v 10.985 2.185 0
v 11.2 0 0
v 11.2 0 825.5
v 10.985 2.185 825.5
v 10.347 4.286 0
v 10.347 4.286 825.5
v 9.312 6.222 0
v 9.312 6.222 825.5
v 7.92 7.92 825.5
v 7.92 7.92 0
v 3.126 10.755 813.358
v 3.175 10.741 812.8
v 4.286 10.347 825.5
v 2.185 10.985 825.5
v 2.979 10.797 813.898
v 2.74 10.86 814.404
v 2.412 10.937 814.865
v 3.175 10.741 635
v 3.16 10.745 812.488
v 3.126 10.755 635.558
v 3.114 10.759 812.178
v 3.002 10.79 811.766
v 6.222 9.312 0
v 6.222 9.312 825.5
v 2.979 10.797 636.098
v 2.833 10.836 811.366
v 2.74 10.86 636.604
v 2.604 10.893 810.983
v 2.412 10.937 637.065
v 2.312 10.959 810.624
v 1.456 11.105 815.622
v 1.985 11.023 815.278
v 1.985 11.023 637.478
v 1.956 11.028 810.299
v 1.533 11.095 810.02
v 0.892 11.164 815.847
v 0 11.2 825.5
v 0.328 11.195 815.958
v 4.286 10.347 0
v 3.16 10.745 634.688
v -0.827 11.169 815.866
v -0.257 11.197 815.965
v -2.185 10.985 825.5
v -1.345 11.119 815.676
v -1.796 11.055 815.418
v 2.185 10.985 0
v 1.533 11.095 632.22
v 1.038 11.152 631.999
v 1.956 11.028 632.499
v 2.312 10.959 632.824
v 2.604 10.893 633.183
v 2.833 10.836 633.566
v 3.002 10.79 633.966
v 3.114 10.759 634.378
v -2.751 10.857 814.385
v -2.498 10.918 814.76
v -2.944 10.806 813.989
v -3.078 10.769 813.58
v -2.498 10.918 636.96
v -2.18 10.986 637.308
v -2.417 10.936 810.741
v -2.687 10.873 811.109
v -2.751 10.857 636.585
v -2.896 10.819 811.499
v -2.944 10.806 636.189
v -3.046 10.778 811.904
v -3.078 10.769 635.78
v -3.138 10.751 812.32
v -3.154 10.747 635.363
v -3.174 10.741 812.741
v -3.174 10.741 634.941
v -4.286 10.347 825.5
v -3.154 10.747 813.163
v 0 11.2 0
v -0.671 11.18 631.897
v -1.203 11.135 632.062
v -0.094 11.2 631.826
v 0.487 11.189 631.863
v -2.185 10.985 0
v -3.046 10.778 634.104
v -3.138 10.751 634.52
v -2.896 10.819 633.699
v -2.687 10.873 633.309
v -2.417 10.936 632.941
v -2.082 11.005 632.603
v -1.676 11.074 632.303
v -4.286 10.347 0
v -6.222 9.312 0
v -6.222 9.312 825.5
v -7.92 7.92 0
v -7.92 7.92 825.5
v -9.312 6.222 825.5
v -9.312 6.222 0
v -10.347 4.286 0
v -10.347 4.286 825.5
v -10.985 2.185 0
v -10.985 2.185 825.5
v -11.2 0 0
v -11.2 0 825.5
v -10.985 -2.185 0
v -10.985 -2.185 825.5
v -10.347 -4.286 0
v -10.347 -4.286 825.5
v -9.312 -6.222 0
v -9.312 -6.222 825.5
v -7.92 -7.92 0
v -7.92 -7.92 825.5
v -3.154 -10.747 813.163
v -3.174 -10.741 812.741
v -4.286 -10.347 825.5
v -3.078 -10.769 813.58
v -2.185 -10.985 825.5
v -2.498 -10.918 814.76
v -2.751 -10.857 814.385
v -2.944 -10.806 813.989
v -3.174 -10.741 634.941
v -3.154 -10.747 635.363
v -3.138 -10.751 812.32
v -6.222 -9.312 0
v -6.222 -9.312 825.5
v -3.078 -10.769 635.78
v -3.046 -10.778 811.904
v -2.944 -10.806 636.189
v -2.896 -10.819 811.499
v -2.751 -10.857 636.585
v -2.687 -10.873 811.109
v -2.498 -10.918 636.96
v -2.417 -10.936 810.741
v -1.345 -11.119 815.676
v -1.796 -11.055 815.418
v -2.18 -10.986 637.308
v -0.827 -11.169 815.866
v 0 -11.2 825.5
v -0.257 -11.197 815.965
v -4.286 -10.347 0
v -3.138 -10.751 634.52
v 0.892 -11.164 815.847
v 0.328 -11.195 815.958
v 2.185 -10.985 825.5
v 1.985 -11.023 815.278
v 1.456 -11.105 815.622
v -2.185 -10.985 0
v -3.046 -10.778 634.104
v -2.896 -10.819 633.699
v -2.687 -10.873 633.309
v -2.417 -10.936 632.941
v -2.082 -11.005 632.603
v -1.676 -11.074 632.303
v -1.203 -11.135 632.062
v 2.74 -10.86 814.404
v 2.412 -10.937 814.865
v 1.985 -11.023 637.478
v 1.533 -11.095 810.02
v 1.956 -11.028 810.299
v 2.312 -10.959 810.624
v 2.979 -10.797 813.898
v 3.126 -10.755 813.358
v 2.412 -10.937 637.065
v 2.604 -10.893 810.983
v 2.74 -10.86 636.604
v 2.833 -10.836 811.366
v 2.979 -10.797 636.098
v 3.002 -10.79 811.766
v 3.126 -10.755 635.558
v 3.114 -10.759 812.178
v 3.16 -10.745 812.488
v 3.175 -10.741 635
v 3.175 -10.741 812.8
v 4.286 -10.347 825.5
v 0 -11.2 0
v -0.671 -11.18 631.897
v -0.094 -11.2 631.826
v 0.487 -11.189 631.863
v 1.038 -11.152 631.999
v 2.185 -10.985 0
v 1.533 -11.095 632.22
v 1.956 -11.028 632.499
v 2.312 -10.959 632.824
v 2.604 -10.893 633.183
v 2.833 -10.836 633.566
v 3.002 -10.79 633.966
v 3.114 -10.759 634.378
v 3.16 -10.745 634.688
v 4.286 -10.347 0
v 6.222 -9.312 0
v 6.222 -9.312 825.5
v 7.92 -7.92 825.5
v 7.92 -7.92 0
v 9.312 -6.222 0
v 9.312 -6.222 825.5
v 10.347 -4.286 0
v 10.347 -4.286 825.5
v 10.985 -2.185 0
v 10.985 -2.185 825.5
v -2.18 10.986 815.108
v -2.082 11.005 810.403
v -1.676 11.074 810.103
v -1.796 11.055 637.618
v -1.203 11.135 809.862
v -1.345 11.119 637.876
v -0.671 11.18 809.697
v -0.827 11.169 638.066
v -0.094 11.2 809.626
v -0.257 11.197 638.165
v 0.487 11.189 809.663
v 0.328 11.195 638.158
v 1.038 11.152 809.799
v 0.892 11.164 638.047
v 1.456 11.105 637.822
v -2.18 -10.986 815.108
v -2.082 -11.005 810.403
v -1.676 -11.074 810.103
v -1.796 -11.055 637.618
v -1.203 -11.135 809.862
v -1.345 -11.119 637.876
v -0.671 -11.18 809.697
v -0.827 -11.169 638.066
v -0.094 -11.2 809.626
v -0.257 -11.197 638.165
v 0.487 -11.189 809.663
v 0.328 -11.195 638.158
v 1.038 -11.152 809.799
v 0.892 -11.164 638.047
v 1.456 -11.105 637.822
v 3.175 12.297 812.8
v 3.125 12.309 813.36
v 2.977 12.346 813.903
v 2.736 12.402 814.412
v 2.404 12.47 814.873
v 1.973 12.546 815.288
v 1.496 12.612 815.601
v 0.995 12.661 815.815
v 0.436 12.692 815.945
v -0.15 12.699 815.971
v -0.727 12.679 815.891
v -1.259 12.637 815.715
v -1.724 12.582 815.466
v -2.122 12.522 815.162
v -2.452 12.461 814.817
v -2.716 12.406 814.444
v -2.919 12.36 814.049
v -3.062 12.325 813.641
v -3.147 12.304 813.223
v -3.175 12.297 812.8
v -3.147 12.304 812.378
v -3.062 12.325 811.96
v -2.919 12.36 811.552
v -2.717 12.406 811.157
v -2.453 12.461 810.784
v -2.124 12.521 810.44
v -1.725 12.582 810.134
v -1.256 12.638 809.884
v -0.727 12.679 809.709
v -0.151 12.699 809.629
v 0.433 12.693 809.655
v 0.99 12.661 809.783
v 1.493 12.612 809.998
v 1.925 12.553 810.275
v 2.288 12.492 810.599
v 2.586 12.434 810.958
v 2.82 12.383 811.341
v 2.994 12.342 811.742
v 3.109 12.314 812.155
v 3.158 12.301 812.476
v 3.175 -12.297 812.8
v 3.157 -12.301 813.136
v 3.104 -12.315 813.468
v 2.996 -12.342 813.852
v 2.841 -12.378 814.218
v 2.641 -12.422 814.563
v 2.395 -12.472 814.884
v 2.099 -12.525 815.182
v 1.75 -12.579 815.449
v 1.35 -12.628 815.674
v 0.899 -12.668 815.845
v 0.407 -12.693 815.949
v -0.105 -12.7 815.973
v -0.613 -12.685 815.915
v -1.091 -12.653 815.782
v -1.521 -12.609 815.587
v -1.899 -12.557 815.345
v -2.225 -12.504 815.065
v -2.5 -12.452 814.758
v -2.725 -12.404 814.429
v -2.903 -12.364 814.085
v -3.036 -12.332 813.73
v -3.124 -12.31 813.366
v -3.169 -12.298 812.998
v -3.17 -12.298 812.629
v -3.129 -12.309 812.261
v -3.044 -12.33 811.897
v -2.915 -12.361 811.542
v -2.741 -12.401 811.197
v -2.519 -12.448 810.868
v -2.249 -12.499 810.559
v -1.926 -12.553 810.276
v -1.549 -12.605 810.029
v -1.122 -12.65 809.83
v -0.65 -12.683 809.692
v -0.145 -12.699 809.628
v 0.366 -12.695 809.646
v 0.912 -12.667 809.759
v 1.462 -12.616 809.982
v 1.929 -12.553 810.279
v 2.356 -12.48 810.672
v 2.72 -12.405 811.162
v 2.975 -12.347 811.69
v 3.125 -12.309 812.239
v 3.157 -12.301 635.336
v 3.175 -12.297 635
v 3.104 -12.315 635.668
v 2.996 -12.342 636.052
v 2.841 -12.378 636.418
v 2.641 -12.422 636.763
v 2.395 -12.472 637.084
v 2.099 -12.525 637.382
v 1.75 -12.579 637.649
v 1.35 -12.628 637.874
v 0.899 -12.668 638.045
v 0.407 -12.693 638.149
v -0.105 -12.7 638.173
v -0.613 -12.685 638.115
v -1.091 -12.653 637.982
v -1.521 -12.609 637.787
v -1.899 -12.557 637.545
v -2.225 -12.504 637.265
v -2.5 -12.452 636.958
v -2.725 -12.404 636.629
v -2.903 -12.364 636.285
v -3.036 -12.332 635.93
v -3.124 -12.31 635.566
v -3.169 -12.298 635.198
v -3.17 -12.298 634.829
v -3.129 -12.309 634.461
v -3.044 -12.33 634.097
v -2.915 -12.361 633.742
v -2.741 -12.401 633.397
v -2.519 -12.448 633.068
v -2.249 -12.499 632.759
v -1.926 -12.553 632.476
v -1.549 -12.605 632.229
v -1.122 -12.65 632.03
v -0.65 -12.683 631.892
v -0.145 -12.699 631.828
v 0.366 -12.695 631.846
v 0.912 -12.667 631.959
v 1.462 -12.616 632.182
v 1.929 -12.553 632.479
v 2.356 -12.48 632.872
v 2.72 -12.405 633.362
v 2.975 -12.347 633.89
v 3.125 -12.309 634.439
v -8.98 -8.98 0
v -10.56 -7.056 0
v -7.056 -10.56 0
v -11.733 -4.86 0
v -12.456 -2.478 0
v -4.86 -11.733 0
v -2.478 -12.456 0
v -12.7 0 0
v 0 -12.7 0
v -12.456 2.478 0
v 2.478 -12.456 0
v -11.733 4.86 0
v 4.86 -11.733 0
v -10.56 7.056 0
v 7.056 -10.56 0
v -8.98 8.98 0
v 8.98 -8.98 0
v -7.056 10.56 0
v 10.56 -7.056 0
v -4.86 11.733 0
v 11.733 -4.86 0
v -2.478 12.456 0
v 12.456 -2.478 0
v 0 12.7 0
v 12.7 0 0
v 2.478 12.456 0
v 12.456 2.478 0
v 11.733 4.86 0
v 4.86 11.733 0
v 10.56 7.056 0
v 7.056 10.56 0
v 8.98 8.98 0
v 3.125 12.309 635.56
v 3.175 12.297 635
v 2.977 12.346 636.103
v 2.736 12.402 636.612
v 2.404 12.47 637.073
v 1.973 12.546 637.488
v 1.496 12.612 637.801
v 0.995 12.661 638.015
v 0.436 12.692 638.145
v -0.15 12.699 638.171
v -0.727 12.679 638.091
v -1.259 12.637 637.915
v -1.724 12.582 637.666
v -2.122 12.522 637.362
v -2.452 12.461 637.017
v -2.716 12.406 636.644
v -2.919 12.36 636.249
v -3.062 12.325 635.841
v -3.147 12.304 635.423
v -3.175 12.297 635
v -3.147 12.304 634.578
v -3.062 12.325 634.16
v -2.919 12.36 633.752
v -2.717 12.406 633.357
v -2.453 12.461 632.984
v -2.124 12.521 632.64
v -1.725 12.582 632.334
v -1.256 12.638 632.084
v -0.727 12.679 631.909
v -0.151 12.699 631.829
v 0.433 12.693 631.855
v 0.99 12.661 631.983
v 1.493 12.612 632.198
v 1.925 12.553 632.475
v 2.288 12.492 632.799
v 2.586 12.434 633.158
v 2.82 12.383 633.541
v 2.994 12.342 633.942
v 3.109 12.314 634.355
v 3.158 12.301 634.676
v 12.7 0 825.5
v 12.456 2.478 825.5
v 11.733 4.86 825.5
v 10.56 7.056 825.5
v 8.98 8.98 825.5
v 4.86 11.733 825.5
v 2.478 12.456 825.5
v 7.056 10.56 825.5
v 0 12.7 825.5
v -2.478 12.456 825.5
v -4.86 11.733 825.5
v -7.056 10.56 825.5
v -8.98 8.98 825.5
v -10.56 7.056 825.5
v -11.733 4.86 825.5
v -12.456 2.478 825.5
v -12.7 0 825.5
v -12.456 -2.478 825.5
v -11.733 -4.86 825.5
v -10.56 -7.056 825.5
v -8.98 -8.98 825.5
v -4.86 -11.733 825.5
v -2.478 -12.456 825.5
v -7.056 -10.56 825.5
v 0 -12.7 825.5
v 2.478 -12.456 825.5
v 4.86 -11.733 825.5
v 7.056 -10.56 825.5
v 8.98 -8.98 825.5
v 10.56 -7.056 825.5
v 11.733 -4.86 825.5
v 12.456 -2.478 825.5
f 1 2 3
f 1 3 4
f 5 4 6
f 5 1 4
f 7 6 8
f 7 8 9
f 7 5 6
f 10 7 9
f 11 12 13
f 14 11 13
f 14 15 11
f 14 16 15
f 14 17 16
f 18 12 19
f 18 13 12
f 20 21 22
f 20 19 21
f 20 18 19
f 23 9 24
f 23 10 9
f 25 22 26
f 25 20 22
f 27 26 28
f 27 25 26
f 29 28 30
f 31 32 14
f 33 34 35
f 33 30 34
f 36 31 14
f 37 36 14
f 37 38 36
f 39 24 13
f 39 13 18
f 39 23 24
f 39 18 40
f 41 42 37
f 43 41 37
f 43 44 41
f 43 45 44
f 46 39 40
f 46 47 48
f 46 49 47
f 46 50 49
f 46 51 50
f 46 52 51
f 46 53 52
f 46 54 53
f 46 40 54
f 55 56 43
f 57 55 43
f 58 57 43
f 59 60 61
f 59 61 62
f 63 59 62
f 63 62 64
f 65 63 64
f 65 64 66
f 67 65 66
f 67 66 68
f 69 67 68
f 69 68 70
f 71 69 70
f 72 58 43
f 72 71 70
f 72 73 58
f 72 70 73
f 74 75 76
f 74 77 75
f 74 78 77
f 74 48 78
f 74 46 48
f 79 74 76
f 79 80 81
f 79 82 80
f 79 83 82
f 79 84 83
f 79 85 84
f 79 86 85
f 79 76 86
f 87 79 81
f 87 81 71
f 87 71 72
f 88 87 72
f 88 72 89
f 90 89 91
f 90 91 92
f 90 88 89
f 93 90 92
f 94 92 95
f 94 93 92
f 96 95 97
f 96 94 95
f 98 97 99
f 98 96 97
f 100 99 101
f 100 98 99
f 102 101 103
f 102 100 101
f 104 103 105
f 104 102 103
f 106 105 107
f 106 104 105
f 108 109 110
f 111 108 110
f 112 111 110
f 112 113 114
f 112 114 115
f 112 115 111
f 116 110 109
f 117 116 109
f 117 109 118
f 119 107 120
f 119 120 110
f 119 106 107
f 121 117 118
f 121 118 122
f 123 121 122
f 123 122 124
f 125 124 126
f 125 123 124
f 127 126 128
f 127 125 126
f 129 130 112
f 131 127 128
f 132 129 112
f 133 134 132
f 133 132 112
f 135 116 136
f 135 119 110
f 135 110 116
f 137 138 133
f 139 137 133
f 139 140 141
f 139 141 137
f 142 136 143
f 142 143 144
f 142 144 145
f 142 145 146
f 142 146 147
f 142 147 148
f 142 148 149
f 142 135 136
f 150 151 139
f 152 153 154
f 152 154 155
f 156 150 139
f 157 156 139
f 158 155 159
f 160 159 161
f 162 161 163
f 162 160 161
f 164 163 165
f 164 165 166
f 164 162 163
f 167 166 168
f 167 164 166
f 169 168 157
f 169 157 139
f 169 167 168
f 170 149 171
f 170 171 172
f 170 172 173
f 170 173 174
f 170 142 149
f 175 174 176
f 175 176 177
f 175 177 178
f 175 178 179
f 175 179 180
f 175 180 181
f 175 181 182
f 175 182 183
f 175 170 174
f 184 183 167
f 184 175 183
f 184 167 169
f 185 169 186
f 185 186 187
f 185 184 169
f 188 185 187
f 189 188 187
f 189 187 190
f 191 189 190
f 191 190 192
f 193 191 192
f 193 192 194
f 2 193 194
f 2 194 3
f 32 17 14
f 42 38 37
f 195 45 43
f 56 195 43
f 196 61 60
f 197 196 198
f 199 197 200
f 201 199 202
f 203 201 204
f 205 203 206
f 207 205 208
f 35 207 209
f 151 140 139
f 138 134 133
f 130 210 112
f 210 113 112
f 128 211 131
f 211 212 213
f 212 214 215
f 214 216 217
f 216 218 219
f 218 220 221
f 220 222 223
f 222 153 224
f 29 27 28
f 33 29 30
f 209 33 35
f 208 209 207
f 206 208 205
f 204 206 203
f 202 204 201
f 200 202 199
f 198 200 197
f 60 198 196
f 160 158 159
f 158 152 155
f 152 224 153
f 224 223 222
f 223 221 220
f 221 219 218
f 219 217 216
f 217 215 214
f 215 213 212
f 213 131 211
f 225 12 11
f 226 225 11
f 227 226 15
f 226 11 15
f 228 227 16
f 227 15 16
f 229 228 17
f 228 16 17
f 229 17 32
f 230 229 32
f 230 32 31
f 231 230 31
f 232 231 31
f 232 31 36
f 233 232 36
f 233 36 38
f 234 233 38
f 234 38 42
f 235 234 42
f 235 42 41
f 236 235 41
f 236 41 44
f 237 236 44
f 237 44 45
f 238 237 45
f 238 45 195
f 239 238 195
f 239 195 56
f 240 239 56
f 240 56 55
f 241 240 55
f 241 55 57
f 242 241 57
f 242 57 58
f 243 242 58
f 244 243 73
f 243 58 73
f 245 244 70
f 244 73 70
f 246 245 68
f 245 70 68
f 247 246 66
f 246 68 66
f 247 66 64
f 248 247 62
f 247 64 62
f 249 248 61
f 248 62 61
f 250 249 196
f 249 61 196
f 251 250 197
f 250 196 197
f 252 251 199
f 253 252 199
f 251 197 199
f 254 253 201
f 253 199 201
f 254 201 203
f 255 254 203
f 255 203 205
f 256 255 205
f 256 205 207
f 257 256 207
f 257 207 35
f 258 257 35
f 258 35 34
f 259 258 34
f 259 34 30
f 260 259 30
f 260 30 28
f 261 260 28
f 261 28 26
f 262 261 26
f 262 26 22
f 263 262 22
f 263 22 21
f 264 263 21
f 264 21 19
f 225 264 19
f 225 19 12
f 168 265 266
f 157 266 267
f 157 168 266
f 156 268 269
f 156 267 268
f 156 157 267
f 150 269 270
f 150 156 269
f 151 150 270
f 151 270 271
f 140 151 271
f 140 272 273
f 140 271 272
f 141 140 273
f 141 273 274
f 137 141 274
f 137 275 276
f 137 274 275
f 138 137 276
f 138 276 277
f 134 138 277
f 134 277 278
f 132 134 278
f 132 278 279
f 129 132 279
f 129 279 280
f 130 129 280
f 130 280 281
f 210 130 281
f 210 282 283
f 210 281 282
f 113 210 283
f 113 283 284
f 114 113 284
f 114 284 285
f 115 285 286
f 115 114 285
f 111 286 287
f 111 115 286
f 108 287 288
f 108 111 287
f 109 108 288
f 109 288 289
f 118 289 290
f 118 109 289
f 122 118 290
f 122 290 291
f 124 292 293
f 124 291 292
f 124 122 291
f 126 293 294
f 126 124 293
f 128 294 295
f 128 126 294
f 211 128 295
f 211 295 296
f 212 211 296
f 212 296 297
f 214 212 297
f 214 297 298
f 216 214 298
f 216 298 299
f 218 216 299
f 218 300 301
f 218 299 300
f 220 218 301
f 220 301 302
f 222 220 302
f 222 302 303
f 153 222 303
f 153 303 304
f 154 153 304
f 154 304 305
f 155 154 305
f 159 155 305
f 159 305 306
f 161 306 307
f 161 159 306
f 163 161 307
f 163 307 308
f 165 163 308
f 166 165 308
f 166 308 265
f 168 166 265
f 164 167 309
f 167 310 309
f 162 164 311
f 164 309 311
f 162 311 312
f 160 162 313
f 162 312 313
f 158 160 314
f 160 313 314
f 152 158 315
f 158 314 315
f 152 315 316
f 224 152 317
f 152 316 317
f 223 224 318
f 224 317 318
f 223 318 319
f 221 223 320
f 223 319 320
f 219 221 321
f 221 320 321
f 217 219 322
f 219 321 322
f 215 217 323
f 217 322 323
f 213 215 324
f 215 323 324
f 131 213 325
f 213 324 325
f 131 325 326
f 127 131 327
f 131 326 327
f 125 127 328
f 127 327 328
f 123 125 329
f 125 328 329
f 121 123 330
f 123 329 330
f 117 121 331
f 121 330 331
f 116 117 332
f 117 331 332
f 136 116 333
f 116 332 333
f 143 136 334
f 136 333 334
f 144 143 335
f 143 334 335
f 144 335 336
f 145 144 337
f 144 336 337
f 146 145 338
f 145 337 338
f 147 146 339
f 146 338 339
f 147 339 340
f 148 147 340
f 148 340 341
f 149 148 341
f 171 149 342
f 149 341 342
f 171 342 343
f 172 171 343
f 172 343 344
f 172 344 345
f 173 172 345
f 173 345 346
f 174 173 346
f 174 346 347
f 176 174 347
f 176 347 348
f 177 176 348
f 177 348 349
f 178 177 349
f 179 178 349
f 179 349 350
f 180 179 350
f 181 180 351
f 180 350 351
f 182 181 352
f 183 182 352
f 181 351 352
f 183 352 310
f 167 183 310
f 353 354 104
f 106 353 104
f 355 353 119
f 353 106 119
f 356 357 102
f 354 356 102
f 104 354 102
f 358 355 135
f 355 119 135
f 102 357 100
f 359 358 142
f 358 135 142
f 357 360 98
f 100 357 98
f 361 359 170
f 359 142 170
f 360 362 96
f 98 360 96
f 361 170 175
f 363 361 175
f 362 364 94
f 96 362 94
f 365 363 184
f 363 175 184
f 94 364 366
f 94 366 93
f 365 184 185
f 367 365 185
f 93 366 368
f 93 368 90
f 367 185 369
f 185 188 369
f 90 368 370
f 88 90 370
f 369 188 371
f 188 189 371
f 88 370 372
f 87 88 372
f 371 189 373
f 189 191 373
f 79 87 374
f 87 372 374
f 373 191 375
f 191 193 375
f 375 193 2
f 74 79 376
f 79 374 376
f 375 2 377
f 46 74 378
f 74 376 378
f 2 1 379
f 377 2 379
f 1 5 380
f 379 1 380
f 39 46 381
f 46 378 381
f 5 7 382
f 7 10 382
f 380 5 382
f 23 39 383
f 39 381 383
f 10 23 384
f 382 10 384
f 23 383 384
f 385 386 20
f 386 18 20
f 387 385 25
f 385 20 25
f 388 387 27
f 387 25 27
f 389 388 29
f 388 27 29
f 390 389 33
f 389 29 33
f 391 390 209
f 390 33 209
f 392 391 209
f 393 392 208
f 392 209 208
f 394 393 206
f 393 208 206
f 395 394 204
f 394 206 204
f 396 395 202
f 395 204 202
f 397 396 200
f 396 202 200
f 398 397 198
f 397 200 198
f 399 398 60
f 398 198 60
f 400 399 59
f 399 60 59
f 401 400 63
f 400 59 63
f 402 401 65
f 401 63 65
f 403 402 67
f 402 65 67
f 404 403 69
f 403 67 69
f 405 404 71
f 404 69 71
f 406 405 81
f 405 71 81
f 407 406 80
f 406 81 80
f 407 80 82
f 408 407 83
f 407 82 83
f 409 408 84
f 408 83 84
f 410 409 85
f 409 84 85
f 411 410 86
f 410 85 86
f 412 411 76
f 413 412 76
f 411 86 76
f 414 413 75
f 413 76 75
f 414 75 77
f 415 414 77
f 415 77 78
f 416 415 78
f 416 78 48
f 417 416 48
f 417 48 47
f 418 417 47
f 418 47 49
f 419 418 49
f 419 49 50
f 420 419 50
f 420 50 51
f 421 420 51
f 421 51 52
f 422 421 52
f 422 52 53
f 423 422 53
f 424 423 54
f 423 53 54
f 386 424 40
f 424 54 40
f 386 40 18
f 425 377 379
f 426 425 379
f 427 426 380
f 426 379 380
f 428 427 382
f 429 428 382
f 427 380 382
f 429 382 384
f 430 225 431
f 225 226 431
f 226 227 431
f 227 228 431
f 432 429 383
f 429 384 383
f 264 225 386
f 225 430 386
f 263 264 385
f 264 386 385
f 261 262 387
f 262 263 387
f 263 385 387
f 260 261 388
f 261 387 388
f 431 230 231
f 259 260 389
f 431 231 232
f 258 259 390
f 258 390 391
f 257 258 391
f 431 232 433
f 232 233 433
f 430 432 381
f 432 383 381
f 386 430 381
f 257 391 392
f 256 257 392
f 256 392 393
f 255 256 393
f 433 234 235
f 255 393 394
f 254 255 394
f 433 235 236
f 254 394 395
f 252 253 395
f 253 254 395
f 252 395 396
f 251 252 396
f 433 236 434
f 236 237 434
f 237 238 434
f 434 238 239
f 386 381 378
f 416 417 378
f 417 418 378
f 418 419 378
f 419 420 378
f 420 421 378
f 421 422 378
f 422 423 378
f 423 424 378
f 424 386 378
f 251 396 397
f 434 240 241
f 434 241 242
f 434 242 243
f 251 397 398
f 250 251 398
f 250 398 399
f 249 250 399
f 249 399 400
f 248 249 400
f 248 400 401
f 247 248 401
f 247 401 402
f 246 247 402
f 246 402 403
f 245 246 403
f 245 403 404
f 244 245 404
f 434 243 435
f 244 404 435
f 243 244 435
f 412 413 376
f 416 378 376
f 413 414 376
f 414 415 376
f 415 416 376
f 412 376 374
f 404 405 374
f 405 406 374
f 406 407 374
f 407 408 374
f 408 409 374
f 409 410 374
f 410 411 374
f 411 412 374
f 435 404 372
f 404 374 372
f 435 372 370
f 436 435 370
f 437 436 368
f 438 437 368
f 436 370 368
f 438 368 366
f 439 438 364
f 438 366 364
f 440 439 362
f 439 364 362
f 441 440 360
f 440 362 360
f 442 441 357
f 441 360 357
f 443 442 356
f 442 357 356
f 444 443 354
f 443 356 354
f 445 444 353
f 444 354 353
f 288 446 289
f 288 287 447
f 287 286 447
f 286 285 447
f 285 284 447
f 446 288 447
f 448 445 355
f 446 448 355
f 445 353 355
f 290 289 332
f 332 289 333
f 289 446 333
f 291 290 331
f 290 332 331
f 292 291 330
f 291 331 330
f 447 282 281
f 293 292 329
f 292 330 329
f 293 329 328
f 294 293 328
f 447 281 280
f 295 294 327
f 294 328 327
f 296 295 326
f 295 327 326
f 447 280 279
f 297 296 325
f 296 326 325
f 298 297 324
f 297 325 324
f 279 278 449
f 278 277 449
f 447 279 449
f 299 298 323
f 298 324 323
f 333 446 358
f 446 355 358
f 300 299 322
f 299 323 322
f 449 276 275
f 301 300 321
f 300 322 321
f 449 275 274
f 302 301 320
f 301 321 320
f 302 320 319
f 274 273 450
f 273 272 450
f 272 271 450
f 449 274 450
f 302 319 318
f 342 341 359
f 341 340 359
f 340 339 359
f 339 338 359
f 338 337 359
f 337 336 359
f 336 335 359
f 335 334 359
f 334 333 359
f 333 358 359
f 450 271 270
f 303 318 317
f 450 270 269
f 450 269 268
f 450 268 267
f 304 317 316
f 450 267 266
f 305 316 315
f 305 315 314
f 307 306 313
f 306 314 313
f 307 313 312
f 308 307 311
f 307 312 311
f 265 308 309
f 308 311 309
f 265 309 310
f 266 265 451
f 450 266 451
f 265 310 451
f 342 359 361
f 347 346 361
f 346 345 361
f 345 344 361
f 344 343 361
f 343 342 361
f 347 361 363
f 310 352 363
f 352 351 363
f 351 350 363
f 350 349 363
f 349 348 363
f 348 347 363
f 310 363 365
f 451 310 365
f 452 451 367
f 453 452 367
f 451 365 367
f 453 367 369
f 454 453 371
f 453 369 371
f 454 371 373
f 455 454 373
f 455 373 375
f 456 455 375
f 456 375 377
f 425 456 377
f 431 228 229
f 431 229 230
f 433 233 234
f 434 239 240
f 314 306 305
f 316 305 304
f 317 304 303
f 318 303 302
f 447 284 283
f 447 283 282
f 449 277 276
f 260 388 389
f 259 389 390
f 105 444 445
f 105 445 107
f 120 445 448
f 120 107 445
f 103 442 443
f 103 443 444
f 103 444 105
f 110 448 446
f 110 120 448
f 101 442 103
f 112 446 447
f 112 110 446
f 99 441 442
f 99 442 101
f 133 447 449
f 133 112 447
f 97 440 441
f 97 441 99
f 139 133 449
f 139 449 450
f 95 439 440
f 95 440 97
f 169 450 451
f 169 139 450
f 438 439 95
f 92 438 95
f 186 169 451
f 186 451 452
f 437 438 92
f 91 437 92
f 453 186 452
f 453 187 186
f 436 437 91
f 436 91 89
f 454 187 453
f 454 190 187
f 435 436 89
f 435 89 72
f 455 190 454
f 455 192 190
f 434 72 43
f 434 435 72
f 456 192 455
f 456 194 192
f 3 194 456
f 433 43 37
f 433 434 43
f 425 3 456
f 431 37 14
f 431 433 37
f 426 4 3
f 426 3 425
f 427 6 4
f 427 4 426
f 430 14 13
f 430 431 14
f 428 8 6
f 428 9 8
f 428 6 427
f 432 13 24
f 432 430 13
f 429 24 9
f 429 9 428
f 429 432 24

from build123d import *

# Parameters (mm, degrees)
F0_R     = 12.7
F0_R_2   = 11.2
F1_DEPTH = 825.5
F2_R     = 3.175
F3_DEPTH = 12.7


with BuildPart() as f1:
    # F0 (on Top) → F1 (new body)
    with BuildSketch(Plane.XY):
        Circle(F0_R)
        Circle(F0_R_2, mode=Mode.SUBTRACT)
    extrude(amount=F1_DEPTH)

    # F2 (on Front) → F3 (cut, symmetric)
    with BuildSketch(Plane.XZ):
        with Locations((0, 812.8)):
            Circle(F2_R)
        with Locations((0, 635)):
            Circle(F2_R)
    extrude(amount=F3_DEPTH, both=True, mode=Mode.SUBTRACT)


solid = f1.part
